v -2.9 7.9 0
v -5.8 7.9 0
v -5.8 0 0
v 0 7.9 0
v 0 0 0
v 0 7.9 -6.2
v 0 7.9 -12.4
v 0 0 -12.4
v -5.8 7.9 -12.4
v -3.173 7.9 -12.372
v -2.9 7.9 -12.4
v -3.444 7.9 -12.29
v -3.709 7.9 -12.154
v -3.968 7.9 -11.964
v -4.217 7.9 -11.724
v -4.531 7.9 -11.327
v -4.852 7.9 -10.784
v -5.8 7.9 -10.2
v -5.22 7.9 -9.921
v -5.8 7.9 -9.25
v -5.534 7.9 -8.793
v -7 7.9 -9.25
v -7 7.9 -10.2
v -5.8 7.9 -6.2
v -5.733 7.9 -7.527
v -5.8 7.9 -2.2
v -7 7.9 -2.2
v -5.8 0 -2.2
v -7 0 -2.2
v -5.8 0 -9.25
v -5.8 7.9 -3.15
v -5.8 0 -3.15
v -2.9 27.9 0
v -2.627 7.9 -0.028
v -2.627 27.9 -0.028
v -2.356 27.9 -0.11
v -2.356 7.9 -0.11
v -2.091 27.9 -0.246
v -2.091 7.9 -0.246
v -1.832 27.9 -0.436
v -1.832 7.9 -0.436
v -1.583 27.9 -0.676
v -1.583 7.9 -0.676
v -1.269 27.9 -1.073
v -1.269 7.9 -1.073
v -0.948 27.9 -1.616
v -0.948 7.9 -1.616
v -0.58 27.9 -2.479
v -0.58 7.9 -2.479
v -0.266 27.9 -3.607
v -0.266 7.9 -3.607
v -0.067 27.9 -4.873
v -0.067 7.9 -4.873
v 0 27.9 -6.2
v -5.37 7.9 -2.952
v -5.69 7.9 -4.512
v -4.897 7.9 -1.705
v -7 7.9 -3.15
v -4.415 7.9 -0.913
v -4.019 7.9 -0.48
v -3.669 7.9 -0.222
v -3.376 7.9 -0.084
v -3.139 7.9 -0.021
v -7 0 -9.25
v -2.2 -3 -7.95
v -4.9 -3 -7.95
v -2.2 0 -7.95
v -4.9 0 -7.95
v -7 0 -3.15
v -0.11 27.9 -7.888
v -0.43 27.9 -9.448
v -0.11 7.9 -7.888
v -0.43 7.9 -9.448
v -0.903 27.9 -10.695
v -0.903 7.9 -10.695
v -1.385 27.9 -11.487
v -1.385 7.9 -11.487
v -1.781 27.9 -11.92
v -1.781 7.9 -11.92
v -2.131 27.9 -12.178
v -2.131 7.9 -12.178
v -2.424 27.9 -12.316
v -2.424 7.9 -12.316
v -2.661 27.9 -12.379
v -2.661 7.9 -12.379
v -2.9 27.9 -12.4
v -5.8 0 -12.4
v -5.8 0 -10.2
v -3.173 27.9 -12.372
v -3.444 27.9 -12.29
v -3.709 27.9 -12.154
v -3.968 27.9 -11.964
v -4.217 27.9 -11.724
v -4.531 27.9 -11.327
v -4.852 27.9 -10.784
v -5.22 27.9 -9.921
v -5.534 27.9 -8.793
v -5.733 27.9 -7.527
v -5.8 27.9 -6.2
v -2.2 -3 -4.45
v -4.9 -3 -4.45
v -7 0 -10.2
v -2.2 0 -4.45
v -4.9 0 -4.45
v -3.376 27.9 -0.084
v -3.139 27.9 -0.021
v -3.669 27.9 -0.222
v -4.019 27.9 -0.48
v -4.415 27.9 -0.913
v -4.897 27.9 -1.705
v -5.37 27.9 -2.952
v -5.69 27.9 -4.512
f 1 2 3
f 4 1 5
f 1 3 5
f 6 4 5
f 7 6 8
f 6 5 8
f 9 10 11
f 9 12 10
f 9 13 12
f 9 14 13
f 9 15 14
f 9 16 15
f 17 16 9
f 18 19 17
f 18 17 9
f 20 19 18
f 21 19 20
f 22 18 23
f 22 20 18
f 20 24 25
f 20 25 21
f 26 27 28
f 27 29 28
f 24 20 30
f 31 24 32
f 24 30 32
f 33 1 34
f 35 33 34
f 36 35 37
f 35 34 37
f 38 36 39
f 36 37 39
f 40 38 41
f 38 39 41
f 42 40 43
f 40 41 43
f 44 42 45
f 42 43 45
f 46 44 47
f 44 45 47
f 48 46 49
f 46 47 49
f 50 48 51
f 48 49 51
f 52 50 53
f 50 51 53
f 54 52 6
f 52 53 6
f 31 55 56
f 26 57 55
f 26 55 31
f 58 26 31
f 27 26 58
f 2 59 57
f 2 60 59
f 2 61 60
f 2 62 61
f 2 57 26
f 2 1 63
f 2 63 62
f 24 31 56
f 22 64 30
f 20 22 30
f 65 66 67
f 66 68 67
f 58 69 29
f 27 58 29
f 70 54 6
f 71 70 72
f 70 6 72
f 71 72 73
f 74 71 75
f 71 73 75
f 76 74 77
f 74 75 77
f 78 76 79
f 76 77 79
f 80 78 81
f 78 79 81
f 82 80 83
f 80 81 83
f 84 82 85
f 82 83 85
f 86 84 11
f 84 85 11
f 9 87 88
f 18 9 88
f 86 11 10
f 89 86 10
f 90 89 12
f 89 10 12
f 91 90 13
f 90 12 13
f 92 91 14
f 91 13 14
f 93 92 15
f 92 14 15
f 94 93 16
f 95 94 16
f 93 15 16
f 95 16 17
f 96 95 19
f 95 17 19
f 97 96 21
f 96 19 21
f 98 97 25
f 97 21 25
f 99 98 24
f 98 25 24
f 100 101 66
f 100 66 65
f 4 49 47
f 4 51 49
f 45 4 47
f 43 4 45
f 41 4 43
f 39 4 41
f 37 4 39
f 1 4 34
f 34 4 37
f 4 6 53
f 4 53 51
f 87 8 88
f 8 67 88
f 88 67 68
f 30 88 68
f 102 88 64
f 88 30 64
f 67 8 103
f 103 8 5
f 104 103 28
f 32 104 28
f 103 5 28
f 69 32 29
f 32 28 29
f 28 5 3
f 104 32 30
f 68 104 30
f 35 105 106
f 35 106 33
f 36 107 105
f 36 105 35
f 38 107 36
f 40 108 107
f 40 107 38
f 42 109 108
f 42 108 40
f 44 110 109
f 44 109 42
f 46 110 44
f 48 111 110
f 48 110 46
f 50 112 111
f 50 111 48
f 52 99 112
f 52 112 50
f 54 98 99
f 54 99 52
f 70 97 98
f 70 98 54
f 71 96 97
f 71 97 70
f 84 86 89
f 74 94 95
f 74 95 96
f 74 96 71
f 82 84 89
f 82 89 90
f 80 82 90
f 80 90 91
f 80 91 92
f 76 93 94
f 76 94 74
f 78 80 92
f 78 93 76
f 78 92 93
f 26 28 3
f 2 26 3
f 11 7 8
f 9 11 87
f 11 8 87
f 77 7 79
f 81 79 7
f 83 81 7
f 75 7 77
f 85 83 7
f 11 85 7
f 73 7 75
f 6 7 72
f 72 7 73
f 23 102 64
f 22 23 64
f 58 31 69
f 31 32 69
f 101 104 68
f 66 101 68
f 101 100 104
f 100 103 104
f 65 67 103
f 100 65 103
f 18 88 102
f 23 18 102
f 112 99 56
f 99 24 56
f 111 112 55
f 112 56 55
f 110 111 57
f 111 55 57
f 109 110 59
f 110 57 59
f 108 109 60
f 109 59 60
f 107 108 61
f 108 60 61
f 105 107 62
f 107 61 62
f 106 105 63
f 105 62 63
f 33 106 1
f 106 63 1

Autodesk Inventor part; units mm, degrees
ref_plane "YZ Plane" through (0, 0, 0) normal (1, 0, 0) x (0, 1, 0)
ref_plane "XZ Plane" through (0, 0, 0) normal (0, 1, 0) x (-1, 0, 0)
ref_plane "XY Plane" through (0, 0, 0) normal (0, 0, 1) x (1, 0, 0)
sketch "スケッチ1" plane through (0, 0, 0) normal (0, 1, 0) x (-1, 0, 0)
  line L0 (0, 0) -> (0, -12.4)
  line L1 (0, -12.4) -> (5.8, -12.4)
  line L2 (5.8, -12.4) -> (5.8, -10.2)
  line L3 (5.8, -10.2) -> (7, -10.2)
  line L4 (7, -10.2) -> (7, -9.25)
  line L5 (7, -9.25) -> (5.8, -9.25)
  line L6 (5.8, -9.25) -> (5.8, -3.15)
  line L7 (5.8, -3.15) -> (7, -3.15)
  line L8 (7, -3.15) -> (7, -2.2)
  line L9 (7, -2.2) -> (5.8, -2.2)
  line L10 (5.8, -2.2) -> (5.8, 0)
  line L11 (5.8, 0) -> (0, 0)
  dimension "d1" = 12.4
  dimension "d2" = 5.8
  dimension "d3" = 0.95
  dimension "d5" = 7
  dimension "d6" = 8
extrude "押し出し1" add sketch "スケッチ1" along normal blind 7.9
sketch "スケッチ2" plane through (0, 7.9, 0) normal (0, 1, 0) x (1, 0, 0)
  line L0 (-5.8, 0) -> (0, 0) projected
  line L1 (0, 12.4) -> (-5.8, 12.4) projected
  line L2 (-5.8, 12.4) -> (-5.8, 10.2) projected
  line L3 (-5.8, 10.2) -> (-7, 10.2) projected
  line L4 (-7, 10.2) -> (-7, 9.25) projected
  line L5 (-7, 9.25) -> (-5.8, 9.25) projected
  line L6 (-5.8, 9.25) -> (-5.8, 3.15) projected
  line L7 (-5.8, 3.15) -> (-7, 3.15) projected
  line L8 (-7, 3.15) -> (-7, 2.2) projected
  line L9 (-7, 2.2) -> (-5.8, 2.2) projected
  line L10 (-5.8, 2.2) -> (-5.8, 0) projected
  line L11 (-5.8, 0) -> (0, 0) projected
  line L12 (0, 0) -> (0, 12.4) projected
  ellipse E0 centre (-2.9, 6.2) end of major axis (-5.8, 6.2) minor radius 6.2
  point P0 (-2.9, 0)
  point P1 (-2.9, 12.4)
  point P2 (0, 6.2)
  point P3 (-5.8, 6.2)
extrude "押し出し2" add sketch "スケッチ2" along normal blind 20 contours E0
sketch "スケッチ4" plane through (0, 0, 0) normal (0, -1, 0) x (1, 0, 0)
  line L0 (-2.2, -4.45) -> (-4.9, -4.45)
  line L1 (-4.9, -4.45) -> (-4.9, -7.95)
  line L2 (-4.9, -7.95) -> (-2.2, -7.95)
  line L3 (-2.2, -7.95) -> (-2.2, -4.45)
  line L4 (0, 0) -> (0, -12.4) projected
  point P0 (0, -6.2)
  point P1 (-2.2, -6.2)
  dimension "d11" = 2.7
  dimension "d12" = 3.5
  dimension "d13" = 2.2
extrude "押し出し3" add sketch "スケッチ4" along normal blind 3
properties part number "Lipo"
